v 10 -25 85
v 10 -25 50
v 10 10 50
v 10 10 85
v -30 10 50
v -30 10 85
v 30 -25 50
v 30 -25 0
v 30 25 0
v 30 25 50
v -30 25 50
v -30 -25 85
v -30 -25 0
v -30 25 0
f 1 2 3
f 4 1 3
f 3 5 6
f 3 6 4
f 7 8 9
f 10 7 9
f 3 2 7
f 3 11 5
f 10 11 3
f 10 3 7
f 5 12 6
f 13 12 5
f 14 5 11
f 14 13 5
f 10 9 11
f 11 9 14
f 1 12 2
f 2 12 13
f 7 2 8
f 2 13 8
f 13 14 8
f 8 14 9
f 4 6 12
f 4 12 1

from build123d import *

# Parameters (mm, degrees)
F1_W     = 40
F1_H     = 35
F3_DEPTH = 50
F2_W     = 40
F2_H     = 35
F4_DEPTH = 35


with BuildPart() as f3:
    # F1 (on Top) → F3 (new body)
    with BuildSketch(Plane.XY):
        with Locations((-10, -7.5)):
            Rectangle(F1_W, F1_H)
        Polygon((30, 25), (-30, 25), (-30, 10), (10, 10), (10, -25), (30, -25), align=None)
    extrude(amount=F3_DEPTH)

    # F2 (on offset) → F4 (join)
    with BuildSketch(Plane.XY.offset(50)):
        with Locations((-10, -7.5)):
            Rectangle(F2_W, F2_H)
    extrude(amount=F4_DEPTH)


solid = f3.part
